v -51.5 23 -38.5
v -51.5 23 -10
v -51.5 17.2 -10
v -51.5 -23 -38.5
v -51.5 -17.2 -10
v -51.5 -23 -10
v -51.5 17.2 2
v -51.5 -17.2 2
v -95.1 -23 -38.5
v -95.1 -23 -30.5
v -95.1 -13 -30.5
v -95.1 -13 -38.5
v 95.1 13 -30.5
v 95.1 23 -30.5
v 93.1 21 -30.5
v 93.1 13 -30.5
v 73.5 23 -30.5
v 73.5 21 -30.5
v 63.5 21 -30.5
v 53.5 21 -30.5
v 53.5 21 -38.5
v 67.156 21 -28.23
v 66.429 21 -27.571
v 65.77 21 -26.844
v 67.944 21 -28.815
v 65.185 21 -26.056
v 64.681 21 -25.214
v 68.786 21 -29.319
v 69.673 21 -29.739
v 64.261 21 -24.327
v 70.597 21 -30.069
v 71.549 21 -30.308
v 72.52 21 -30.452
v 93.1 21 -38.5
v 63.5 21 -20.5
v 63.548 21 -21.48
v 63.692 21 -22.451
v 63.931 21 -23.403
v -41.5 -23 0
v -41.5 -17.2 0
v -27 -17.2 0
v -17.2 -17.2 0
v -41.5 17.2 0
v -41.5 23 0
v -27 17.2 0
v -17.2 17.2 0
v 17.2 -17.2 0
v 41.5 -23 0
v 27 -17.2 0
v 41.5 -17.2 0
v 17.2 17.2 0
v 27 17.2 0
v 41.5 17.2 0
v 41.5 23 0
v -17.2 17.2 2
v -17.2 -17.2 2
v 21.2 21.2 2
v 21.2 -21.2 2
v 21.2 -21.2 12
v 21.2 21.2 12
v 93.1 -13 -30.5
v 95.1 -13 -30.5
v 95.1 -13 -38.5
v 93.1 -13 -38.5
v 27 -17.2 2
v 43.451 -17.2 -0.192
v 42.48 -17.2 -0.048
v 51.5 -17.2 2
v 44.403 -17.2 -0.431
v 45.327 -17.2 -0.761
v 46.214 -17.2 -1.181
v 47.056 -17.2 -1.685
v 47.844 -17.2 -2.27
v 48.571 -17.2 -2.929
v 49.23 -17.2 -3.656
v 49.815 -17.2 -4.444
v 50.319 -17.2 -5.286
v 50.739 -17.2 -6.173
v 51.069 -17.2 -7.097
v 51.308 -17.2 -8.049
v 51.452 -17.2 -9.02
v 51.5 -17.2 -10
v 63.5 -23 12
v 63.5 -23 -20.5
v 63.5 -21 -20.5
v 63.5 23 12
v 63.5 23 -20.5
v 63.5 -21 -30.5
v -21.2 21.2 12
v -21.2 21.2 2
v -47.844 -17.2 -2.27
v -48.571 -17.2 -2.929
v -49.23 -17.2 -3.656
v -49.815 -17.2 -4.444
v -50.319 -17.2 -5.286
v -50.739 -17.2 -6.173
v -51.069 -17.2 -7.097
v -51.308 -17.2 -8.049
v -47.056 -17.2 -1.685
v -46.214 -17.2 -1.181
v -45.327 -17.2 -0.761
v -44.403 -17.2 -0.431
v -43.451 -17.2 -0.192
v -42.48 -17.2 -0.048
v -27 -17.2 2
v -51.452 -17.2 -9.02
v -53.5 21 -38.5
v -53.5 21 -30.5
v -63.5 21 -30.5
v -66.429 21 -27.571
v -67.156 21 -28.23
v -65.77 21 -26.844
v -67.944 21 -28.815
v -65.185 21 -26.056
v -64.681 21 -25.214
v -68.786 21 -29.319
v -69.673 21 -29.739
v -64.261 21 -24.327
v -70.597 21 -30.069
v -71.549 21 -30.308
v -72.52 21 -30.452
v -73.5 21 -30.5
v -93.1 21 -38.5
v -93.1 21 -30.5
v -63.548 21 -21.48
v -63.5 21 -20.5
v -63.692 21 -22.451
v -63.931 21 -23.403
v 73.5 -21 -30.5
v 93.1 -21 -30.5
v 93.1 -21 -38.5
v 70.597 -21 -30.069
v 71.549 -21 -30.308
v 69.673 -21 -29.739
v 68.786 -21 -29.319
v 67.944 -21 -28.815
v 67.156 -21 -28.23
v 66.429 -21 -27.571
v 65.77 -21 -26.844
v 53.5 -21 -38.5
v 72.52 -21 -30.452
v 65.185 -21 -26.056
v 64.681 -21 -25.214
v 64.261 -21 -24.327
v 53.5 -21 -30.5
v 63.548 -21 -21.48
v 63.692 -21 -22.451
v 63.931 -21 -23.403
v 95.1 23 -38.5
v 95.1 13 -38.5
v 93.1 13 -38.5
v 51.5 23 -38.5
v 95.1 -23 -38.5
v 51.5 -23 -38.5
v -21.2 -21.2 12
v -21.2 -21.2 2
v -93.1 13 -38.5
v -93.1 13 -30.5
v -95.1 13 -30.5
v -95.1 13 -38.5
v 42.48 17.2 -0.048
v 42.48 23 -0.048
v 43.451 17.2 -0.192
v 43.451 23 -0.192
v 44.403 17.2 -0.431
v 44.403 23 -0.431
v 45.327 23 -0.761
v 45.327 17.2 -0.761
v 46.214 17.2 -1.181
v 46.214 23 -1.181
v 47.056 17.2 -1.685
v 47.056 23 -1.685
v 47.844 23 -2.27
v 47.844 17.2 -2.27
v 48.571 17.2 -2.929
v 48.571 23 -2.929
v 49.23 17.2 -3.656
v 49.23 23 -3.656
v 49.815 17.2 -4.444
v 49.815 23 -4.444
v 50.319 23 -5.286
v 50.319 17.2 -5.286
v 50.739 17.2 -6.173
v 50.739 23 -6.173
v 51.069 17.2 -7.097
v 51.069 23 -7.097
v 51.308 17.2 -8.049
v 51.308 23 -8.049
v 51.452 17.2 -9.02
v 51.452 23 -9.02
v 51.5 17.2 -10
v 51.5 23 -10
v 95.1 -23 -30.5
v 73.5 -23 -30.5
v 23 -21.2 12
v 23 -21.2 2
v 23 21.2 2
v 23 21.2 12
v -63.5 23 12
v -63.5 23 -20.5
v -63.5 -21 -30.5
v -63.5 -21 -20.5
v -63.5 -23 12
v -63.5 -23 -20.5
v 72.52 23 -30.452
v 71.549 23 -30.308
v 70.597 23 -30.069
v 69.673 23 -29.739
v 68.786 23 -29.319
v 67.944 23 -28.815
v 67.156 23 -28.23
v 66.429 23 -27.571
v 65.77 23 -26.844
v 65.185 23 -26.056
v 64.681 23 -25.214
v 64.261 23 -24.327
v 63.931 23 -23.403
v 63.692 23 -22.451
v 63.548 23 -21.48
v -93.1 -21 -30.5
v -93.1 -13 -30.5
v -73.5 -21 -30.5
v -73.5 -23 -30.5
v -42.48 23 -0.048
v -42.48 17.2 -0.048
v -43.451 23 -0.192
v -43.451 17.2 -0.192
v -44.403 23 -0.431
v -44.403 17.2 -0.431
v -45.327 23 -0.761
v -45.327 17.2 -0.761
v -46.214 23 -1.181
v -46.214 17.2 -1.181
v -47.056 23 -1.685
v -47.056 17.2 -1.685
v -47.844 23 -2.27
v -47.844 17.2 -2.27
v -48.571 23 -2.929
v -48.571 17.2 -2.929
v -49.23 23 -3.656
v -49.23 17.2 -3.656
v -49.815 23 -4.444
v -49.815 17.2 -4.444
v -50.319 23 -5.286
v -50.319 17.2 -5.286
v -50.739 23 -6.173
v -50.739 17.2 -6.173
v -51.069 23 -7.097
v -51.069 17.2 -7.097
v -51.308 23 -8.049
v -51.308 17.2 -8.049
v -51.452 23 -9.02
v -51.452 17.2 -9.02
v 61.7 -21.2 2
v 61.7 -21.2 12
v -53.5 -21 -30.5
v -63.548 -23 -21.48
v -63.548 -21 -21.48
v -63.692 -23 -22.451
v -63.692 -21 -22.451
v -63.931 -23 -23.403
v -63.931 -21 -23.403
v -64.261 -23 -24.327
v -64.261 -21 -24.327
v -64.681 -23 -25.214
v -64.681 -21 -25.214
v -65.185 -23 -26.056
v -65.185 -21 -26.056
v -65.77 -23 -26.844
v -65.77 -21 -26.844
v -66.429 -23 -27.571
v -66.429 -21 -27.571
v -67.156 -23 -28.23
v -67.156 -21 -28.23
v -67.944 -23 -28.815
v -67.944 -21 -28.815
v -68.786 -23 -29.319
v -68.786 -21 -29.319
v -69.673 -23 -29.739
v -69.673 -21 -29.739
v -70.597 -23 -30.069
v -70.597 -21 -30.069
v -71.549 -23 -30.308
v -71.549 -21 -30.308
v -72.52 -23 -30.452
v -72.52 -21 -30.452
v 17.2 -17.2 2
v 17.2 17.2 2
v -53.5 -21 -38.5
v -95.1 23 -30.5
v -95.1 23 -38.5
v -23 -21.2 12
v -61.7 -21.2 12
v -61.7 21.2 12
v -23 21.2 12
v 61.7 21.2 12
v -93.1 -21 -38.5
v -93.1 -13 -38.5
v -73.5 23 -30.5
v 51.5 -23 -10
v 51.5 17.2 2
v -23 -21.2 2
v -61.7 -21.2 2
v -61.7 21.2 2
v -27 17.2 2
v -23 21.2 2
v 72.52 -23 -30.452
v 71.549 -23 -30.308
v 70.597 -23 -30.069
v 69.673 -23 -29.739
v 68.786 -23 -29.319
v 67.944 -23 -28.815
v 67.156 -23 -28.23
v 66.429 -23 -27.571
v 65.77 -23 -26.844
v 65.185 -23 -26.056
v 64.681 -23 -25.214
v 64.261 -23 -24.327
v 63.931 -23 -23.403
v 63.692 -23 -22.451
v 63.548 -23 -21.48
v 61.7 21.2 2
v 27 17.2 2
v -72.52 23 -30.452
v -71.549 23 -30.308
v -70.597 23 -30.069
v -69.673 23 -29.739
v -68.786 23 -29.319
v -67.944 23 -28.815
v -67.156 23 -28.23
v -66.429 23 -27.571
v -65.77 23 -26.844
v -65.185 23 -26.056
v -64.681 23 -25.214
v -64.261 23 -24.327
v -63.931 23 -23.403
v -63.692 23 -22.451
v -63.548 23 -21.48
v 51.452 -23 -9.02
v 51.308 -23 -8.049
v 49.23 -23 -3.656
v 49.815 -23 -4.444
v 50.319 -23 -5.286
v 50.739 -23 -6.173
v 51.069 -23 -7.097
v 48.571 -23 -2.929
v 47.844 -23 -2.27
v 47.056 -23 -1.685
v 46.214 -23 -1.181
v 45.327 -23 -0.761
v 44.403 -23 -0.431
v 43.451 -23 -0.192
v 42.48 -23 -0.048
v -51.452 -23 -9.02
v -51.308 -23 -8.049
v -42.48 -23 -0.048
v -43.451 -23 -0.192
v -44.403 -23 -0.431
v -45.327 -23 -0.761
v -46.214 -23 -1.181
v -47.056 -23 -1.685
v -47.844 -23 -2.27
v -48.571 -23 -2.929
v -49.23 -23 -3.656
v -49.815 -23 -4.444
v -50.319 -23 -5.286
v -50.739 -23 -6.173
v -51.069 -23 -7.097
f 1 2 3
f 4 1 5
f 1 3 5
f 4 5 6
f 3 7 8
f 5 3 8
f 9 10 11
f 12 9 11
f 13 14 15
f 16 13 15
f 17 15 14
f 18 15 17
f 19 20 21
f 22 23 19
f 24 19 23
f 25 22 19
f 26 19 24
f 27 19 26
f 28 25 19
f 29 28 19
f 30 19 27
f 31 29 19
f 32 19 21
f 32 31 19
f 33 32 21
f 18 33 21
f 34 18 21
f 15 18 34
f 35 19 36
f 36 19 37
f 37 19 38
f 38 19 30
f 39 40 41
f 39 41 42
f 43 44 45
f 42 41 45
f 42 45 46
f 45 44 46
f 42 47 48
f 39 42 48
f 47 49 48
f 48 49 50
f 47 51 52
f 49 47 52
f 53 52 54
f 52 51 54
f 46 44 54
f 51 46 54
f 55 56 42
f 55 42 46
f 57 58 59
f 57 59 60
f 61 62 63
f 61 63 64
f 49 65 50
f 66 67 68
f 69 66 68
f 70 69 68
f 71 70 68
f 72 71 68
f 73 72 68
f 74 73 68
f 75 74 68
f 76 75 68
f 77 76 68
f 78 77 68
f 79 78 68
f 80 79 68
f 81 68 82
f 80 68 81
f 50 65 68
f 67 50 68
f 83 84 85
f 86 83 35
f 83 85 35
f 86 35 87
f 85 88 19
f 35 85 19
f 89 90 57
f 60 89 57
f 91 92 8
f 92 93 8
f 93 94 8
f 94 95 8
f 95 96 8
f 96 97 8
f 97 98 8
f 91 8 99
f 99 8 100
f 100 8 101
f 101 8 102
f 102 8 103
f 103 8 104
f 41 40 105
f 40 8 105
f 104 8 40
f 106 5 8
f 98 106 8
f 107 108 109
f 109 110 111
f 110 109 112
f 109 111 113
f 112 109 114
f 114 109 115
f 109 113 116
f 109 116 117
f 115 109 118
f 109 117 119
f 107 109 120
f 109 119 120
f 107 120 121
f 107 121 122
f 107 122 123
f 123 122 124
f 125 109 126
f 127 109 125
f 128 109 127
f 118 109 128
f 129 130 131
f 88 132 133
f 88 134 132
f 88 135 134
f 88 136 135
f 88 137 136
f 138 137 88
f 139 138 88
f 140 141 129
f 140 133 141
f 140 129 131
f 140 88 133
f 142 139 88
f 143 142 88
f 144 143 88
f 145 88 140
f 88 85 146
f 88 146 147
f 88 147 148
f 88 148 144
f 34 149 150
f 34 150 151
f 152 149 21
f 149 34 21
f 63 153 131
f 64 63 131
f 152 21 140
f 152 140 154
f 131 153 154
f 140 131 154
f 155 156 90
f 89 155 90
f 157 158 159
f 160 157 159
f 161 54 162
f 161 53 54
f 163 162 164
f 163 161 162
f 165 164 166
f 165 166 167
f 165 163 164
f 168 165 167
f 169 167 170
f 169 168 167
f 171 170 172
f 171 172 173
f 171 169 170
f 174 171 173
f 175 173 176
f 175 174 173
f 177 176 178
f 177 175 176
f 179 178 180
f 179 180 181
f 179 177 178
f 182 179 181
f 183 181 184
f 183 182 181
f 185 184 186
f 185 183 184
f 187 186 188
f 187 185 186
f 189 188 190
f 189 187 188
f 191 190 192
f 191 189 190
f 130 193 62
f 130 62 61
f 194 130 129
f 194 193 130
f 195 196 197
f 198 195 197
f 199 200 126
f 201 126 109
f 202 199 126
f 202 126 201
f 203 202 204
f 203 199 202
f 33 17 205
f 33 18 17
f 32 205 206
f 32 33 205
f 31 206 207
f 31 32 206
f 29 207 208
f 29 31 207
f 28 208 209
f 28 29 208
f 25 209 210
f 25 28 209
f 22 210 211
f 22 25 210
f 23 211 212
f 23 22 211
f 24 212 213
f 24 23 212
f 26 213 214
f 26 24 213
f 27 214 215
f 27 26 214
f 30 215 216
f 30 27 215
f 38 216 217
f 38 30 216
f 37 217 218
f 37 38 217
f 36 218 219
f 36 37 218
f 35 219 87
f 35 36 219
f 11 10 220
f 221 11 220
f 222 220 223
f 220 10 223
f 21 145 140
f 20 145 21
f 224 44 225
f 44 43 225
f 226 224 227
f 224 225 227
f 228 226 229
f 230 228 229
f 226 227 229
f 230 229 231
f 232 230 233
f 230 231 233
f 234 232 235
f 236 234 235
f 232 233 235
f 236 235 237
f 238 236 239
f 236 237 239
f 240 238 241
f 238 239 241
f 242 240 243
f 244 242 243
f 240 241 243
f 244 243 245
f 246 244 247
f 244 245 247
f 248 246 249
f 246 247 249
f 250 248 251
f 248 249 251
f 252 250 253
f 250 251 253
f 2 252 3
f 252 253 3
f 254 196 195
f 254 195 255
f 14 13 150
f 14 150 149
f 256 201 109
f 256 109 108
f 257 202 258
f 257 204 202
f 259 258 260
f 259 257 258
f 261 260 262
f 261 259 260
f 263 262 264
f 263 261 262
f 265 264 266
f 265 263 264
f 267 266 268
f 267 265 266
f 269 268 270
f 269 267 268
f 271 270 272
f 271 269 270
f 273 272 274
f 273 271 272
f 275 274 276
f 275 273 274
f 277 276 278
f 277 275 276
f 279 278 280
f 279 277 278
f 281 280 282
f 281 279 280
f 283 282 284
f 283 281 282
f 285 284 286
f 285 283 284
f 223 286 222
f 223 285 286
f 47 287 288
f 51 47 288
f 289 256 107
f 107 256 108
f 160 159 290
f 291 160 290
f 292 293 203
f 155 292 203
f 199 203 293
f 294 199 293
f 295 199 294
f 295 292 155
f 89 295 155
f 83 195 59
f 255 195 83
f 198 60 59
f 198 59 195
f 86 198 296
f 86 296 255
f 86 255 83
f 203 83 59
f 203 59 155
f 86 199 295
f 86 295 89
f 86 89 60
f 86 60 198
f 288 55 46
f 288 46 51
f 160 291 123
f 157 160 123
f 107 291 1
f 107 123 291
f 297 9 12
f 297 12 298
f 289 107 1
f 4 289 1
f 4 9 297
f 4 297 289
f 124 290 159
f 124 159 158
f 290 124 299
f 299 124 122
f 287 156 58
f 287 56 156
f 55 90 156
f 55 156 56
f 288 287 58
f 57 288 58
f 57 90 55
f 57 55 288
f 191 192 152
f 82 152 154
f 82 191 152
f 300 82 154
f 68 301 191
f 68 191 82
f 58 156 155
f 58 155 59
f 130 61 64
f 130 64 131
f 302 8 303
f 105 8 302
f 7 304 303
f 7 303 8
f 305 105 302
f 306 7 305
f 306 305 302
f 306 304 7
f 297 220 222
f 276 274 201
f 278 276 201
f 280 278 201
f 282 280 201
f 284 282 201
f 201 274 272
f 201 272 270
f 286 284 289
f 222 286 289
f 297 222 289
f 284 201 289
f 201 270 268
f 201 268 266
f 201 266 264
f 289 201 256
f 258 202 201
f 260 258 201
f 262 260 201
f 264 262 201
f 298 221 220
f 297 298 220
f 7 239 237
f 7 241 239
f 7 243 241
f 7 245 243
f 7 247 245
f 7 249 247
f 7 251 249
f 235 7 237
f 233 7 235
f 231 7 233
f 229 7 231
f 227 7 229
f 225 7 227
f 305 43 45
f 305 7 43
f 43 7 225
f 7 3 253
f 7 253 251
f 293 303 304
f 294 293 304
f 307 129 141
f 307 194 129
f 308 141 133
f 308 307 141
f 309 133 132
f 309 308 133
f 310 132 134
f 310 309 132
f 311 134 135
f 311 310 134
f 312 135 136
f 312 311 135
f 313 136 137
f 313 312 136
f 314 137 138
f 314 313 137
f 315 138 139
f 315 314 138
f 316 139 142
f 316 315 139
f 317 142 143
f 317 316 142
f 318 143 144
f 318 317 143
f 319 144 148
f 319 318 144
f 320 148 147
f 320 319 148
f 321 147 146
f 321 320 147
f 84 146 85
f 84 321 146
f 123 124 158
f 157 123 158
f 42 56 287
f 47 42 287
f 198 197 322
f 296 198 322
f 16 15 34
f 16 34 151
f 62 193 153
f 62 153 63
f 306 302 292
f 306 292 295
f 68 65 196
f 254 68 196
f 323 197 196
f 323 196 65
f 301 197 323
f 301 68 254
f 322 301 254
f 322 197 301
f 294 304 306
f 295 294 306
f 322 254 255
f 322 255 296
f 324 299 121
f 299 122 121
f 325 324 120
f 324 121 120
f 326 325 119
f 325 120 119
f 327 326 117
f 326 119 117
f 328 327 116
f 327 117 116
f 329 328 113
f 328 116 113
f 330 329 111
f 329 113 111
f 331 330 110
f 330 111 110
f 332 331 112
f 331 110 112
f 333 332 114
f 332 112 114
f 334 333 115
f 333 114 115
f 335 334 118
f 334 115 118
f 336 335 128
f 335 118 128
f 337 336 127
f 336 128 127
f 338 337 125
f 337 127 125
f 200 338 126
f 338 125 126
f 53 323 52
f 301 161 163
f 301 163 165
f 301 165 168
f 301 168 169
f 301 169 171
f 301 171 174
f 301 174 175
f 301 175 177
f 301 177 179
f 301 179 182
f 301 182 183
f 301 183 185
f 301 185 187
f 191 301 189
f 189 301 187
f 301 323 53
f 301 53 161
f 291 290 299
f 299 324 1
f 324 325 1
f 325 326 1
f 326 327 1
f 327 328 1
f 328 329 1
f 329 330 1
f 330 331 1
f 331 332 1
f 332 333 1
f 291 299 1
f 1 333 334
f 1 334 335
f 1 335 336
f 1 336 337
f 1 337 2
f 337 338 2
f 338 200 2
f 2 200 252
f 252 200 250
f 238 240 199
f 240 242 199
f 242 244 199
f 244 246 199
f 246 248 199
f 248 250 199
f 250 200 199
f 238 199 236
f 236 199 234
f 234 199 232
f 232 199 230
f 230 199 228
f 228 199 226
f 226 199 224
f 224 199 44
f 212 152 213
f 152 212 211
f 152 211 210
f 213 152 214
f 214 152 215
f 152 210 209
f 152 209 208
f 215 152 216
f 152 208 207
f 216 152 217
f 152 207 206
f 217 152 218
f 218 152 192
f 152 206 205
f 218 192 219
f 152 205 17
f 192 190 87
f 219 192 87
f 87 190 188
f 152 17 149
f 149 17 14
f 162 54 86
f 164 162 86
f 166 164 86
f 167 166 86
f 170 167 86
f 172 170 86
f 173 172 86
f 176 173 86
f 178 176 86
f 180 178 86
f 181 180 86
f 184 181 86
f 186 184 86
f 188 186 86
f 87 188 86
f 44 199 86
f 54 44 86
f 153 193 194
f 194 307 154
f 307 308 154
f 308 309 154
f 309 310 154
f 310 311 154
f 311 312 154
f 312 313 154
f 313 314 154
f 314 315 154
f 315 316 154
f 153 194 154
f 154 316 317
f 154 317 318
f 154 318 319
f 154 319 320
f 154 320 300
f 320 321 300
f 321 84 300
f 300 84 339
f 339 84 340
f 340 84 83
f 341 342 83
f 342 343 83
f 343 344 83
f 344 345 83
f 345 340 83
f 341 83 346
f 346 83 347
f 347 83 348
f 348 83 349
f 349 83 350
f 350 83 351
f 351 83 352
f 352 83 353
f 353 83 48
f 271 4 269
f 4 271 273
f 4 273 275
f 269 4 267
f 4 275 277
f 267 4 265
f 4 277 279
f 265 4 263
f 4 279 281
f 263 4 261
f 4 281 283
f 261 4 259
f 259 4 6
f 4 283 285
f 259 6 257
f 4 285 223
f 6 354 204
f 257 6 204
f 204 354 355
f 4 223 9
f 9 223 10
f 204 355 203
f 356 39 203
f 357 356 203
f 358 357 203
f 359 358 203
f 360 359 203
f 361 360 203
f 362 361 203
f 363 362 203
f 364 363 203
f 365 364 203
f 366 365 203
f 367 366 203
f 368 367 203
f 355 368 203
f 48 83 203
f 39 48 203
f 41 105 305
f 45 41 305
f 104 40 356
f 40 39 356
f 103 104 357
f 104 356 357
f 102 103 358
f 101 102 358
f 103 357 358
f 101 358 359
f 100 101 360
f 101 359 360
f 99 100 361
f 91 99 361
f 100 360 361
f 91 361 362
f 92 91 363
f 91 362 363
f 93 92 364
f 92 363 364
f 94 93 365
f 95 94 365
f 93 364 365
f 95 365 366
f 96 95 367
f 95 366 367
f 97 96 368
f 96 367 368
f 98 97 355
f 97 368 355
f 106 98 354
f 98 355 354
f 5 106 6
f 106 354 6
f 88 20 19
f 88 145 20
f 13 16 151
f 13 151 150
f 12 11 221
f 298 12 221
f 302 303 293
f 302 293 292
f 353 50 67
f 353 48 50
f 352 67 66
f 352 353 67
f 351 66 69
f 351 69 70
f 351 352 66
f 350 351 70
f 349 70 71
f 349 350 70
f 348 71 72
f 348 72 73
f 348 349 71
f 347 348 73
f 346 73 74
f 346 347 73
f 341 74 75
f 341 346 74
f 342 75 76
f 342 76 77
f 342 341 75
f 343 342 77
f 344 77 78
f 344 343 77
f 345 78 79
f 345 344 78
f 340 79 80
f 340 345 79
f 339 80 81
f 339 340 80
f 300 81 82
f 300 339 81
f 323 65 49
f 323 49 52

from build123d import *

# Parameters (mm, degrees)
SKETCH_W      = 127
SKETCH_H      = 46
PAD_DEPTH     = 2
SKETCH001_W   = 127
SKETCH001_H   = 46
SKETCH001_W_2 = 42.4
SKETCH001_H_2 = 42.4
SKETCH001_W_3 = 38.7
PAD001_DEPTH  = 10
SKETCH002_W   = 24.5
SKETCH002_H   = 34.4
SKETCH002_W_2 = 34.4
POCKET_DEPTH  = 2.001
SKETCH004_W   = 12
SKETCH004_H   = 46
PAD002_DEPTH  = 30.5
PAD003_DEPTH  = 8
FILLET_R      = 10


with BuildPart() as part:
    # Sketch → Pad (new body)
    with BuildSketch(Plane.XY):
        Rectangle(SKETCH_W, SKETCH_H)
    extrude(amount=PAD_DEPTH)

    # Sketch001 → Pad001 (new body)
    with BuildSketch(Plane.XY.offset(2)):
        Rectangle(SKETCH001_W, SKETCH001_H)
        Rectangle(SKETCH001_W_2, SKETCH001_H_2, mode=Mode.SUBTRACT)
        with Locations((-42.35, 0)):
            Rectangle(SKETCH001_W_3, SKETCH001_H_2, mode=Mode.SUBTRACT)
        with Locations((42.35, 0)):
            Rectangle(SKETCH001_W_3, SKETCH001_H_2, mode=Mode.SUBTRACT)
    extrude(amount=PAD001_DEPTH)

    # Sketch002 → Pocket (cut, through all)
    with BuildSketch(Plane.XY.offset(2)):
        with Locations((-39.25, 0)):
            Rectangle(SKETCH002_W, SKETCH002_H)
        Rectangle(SKETCH002_W_2, SKETCH002_H)
        with Locations((39.25, 0)):
            Rectangle(SKETCH002_W, SKETCH002_H)
    extrude(amount=-POCKET_DEPTH, mode=Mode.SUBTRACT)

    # Sketch004 → Pad002 (new body)
    with BuildSketch(Plane(origin=(0, 0, 0), x_dir=(1, 0, 0), z_dir=(0, 0, -1))):
        with Locations((-57.5, 0)):
            Rectangle(SKETCH004_W, SKETCH004_H)
        with Locations((57.5, 0)):
            Rectangle(SKETCH004_W, SKETCH004_H)
    extrude(amount=PAD002_DEPTH)

    # Sketch005 → Pad003 (new body)
    with BuildSketch(Plane(origin=(0, 0, -30.5), x_dir=(1, 0, 0), z_dir=(0, 0, -1))):
        Polygon((-51.5, 23), (-95.1, 23), (-95.1, 13), (-93.1, 13), (-93.1, 21), (-53.5, 21), (-53.5, -21), (-93.1, -21), (-93.1, -13), (-95.1, -13), (-95.1, -23), (-51.5, -23), align=None)
        Polygon((51.5, 23), (95.1, 23), (95.1, 13), (93.1, 13), (93.1, 21), (53.5, 21), (53.5, -21), (93.1, -21), (93.1, -13), (95.1, -13), (95.1, -23), (51.5, -23), align=None)
    extrude(amount=PAD003_DEPTH)

    # Fillet
    fillet_edges = [part.edges().sort_by_distance(p)[0] for p in [
        (-63.5, -22, -30.5),
        (-63.5, 22, -30.5),
        (63.5, -22, -30.5),
        (63.5, 22, -30.5),
        (-51.5, -20.1, 0),
        (-51.5, 20.1, 0),
        (51.5, -20.1, 0),
        (51.5, 20.1, 0),
    ]]
    fillet(fillet_edges, radius=FILLET_R)


solid = part.part
